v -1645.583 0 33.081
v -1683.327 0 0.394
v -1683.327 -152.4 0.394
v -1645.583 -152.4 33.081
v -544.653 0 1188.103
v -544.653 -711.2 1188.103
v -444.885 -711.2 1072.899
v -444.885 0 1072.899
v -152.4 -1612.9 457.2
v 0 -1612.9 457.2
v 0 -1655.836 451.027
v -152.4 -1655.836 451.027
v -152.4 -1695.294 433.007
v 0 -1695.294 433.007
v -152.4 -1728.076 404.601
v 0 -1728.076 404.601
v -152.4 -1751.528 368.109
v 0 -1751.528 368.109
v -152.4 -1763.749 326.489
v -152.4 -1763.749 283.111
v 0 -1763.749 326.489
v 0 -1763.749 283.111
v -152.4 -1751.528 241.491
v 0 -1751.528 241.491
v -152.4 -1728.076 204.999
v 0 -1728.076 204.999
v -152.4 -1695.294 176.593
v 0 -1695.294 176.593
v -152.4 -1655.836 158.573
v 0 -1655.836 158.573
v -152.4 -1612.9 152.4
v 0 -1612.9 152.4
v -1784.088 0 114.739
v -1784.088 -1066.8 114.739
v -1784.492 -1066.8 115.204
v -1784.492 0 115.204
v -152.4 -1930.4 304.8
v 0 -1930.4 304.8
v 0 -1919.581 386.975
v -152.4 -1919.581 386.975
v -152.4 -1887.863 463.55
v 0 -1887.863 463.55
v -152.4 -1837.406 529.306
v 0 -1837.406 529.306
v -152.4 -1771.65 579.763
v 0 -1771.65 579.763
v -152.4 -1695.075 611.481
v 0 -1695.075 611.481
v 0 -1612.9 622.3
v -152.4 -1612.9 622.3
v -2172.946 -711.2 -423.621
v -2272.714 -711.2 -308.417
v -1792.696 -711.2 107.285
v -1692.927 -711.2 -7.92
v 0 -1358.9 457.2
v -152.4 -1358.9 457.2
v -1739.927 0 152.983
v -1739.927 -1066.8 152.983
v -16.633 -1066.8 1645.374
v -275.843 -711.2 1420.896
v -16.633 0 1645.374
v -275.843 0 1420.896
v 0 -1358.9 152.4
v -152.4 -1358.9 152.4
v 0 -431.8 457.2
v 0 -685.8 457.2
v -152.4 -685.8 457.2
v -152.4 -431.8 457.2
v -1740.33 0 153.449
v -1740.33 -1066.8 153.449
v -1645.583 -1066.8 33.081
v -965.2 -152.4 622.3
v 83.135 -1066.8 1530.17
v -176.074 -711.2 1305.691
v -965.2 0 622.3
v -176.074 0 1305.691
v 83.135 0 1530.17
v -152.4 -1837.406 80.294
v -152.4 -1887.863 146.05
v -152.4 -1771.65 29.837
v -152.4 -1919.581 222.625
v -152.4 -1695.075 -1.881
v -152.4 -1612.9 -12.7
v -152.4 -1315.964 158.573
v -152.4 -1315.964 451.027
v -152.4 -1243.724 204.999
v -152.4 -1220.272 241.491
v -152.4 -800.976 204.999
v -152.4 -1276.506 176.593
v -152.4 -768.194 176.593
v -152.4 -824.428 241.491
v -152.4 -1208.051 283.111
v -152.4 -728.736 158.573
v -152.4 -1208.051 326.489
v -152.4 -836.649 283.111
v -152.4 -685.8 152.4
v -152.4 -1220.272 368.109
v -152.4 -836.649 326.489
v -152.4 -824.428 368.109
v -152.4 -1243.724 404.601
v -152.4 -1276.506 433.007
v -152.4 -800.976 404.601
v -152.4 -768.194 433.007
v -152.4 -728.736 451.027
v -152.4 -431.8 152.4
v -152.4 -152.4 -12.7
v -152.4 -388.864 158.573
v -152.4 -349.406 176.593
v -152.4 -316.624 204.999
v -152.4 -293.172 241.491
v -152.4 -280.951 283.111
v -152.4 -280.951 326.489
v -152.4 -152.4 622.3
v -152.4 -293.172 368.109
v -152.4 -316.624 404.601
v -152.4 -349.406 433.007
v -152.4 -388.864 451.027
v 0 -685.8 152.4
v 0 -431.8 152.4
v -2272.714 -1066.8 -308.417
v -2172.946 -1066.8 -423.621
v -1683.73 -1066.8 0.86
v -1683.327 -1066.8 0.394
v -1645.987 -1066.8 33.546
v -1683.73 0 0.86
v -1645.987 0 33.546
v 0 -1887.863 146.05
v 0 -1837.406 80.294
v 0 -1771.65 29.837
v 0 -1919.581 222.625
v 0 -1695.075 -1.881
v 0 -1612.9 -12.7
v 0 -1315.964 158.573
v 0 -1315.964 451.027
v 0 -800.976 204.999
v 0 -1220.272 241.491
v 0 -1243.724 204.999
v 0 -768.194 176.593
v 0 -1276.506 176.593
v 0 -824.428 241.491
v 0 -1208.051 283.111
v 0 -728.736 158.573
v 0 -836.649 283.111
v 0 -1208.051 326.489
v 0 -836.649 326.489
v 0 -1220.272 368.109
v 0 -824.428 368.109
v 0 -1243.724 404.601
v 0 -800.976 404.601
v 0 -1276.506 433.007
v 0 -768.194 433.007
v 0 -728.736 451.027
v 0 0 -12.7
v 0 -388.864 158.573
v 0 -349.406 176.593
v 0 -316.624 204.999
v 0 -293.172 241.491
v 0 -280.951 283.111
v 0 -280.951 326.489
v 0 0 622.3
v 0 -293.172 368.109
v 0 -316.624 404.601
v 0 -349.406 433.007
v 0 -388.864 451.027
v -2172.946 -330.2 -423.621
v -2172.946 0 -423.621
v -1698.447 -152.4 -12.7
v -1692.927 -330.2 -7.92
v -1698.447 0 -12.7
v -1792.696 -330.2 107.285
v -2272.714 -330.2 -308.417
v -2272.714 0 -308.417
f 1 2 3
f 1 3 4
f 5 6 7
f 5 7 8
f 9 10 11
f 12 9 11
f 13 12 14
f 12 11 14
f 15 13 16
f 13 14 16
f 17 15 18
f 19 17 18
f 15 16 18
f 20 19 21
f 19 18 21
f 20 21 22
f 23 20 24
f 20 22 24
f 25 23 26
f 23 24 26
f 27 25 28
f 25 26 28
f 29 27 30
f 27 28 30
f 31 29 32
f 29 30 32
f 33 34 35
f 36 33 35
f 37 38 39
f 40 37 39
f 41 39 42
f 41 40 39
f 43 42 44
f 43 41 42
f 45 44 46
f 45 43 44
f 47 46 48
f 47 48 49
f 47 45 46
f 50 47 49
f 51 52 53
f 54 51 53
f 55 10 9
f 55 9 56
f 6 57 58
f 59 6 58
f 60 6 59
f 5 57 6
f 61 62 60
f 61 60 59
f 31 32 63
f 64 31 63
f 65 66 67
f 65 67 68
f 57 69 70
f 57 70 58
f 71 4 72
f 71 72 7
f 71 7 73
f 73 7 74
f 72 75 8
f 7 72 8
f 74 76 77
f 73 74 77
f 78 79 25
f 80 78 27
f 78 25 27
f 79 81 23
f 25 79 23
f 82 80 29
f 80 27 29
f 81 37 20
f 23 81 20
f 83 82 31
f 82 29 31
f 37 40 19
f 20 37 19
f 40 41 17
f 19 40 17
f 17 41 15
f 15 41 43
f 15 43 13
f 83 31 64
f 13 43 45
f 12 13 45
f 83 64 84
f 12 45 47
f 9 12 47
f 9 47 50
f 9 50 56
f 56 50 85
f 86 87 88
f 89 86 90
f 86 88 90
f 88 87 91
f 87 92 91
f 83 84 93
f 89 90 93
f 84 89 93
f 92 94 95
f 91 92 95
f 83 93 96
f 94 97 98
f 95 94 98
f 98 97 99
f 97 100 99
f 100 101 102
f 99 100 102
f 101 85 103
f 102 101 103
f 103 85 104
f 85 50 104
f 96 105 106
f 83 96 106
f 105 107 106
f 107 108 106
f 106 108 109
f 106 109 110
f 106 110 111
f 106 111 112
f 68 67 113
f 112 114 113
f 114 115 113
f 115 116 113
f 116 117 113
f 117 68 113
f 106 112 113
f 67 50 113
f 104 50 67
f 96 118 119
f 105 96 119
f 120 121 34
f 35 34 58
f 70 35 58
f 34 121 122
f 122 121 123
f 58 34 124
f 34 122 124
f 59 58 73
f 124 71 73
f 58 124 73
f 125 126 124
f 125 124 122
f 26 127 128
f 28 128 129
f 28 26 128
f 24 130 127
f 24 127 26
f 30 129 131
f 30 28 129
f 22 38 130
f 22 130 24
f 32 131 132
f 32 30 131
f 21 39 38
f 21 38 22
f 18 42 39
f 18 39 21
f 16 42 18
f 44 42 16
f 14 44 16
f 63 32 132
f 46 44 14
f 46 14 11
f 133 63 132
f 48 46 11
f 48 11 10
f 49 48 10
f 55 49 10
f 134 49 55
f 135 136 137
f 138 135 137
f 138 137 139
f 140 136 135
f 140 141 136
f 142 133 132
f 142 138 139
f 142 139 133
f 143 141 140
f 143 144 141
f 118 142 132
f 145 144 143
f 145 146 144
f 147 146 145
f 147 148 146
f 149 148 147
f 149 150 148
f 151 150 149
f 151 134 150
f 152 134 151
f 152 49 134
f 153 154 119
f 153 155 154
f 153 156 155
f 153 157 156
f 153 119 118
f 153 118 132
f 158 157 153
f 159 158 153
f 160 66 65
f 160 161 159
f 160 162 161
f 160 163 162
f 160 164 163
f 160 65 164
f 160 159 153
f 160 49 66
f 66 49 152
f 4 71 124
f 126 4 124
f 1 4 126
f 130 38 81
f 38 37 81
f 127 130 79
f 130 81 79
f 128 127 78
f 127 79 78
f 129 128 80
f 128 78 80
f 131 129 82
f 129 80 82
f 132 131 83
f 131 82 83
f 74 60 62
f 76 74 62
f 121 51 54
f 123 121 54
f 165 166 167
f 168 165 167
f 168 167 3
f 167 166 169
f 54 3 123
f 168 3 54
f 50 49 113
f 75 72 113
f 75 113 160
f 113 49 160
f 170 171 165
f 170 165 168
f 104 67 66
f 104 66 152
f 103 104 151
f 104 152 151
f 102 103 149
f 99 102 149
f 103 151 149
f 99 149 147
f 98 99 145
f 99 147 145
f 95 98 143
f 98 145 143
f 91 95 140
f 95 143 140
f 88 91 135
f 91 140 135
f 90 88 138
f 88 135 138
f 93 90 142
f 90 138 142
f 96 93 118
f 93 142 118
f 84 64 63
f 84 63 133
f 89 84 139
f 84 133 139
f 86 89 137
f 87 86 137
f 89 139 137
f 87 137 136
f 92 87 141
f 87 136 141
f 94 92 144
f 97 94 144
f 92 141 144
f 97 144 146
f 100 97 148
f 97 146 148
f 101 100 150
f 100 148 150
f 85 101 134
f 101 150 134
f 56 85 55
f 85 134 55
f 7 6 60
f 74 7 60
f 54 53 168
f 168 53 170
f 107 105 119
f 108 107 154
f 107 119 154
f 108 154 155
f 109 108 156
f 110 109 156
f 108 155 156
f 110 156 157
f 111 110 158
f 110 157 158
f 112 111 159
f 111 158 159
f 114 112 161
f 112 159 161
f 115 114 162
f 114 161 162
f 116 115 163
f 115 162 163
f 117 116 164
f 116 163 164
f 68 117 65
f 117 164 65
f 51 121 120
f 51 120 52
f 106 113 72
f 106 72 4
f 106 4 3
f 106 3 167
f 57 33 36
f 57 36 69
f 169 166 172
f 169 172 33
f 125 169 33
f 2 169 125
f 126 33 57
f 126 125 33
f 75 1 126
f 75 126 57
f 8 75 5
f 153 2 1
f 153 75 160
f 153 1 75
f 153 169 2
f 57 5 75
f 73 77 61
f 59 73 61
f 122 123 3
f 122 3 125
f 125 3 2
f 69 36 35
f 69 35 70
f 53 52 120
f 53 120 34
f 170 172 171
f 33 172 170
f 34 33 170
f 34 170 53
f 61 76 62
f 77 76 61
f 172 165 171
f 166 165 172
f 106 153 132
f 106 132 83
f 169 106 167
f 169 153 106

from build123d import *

# Parameters (mm, degrees)
F0_W      = 1612.9
F0_H      = 12.7
F0_H_2    = 609.6
F1_DEPTH  = 152.4
F2_W      = 254
F2_H      = 304.8
F3_DEPTH  = 152.4
F4_W      = 317.5
F4_H      = 635
F5_DEPTH  = 152.4
F6_R      = 317.49999
F8_DEPTH  = 152.4
F9_W      = 965.2
F9_H      = 635
F10_DEPTH = 152.4
F12_DEPTH = 152.4
F14_W     = 647.7
F14_H     = 1066.8
F15_DEPTH = 152.4
F16_W     = 2336.8
F16_H     = 1066.8
F17_DEPTH = 152.4
F19_DEPTH = 1066.8
F22_DEPTH = 1066.8
F23_W     = 635
F23_H     = 381
F24_DEPTH = 152.4
F25_W     = 355.6
F25_H     = 711.2
F26_DEPTH = 152.4


# Not quite as in the source:
# - a fillet or chamfer is up to 0.001 mm smaller than in the source, because OpenCascade refuses the exact size
# - a feature names something its author has since deleted; it is built from what else it names


with BuildPart() as f1:
    # F0 (on Right) → F1 (new body)
    with BuildSketch(Plane.YZ):
        with Locations((-806.45, -6.35)):
            Rectangle(F0_W, F0_H)
        with Locations((-806.45, 304.8)):
            Rectangle(F0_W, F0_H_2)
        with Locations((-806.45, 615.95)):
            Rectangle(F0_W, F0_H)
    extrude(amount=-F1_DEPTH)

    # F2 (on face) → F3 (cut)
    with BuildSketch(Plane.YZ):
        with Locations((-558.8, 304.8)):
            Rectangle(F2_W, F2_H)
        with Locations((-1485.9, 304.8)):
            Rectangle(F2_W, F2_H)
    extrude(amount=-F3_DEPTH, mode=Mode.SUBTRACT)

    # F4 (on face) → F5 (join)
    with BuildSketch(Plane.YZ):
        with Locations((-1771.65, 304.8)):
            Rectangle(F4_W, F4_H)
    extrude(amount=-F5_DEPTH)

    # F6 (radius 317.5 in the source; OpenCascade refuses exactly that, so slightly less here)
    f6_edges = [f1.edges().sort_by_distance(p)[0] for p in [
        (-76.2, -1930.4, 622.3),
        (-76.2, -1930.4, -12.7),
    ]]
    fillet(f6_edges, radius=F6_R)

    # F7 (on face) → F8 (cut)
    with BuildSketch(Plane.YZ):
        with BuildLine():
            ThreePointArc((-1485.9, 220.557730325), (-1466.9881087779, 260.8059094878), (-1460.5, 304.8))
            ThreePointArc((-1460.5, 304.8), (-1466.9881087779, 348.7940905122), (-1485.9, 389.042269675))
            ThreePointArc((-1485.9, 389.042269675), (-1511.3, 304.8), (-1485.9, 220.557730325))
        make_face()
        with BuildLine():
            ThreePointArc((-1485.9, 389.042269675), (-1466.9881087779, 348.7940905122), (-1460.5, 304.8))
            ThreePointArc((-1460.5, 304.8), (-1466.9881087779, 260.8059094878), (-1485.9, 220.557730325))
            ThreePointArc((-1485.9, 220.557730325), (-1314.9059094878, 158.8881087779), (-1206.5, 304.8))
            ThreePointArc((-1206.5, 304.8), (-1314.9059094878, 450.7118912221), (-1485.9, 389.042269675))
        make_face()
        with BuildLine():
            ThreePointArc((-1485.9, 220.557730325), (-1511.3, 304.8), (-1485.9, 389.042269675))
            ThreePointArc((-1485.9, 389.042269675), (-1765.3, 304.8), (-1485.9, 220.557730325))
        make_face()
        with BuildLine():
            ThreePointArc((-558.8, 220.557730325), (-539.8881087779, 260.8059094878), (-533.4, 304.8))
            ThreePointArc((-533.4, 304.8), (-539.8881087779, 348.7940905122), (-558.8, 389.042269675))
            ThreePointArc((-558.8, 389.042269675), (-584.2, 304.8), (-558.8, 220.557730325))
        make_face()
        with BuildLine():
            ThreePointArc((-558.8, 389.042269675), (-539.8881087779, 348.7940905122), (-533.4, 304.8))
            ThreePointArc((-533.4, 304.8), (-539.8881087779, 260.8059094878), (-558.8, 220.557730325))
            ThreePointArc((-558.8, 220.557730325), (-387.8059094878, 158.8881087779), (-279.4, 304.8))
            ThreePointArc((-279.4, 304.8), (-387.8059094878, 450.7118912221), (-558.8, 389.042269675))
        make_face()
        with BuildLine():
            ThreePointArc((-558.8, 220.557730325), (-584.2, 304.8), (-558.8, 389.042269675))
            ThreePointArc((-558.8, 389.042269675), (-838.2, 304.8), (-558.8, 220.557730325))
        make_face()
    extrude(amount=-F8_DEPTH, mode=Mode.SUBTRACT)

    # F9 (on face) → F10 (join)
    with BuildSketch(Plane(origin=(0, 0, 0), x_dir=(-1, 0, 0), z_dir=(0, 1, 0))):
        with Locations((482.6, 304.8)):
            Rectangle(F9_W, F9_H)
    extrude(amount=-F10_DEPTH)

    # F11 (on face) → F12 (join)
    with BuildSketch(Plane(origin=(0, 0, 0), x_dir=(-1, 0, 0), z_dir=(0, 1, 0))):
        Polygon((1698.4472, -12.7), (965.2, 622.3), (965.2, -12.7), align=None)
    extrude(amount=-F12_DEPTH)

    # F14 (on offset) → F15 (join)
    with BuildSketch(Plane(origin=(-721.6070671381, 0, 833.2541125657), x_dir=(0.7559344062, 0, 0.6546473658), z_dir=(-0.6546473658, 0, 0.7559344062))):
        with Locations((-1596.0768110359, -533.4)):
            Rectangle(F14_W, F14_H)
    extrude(amount=F15_DEPTH)

    # F16 (on offset) → F17 (join)
    with BuildSketch(Plane(origin=(-721.6070671381, 0, 833.2541125657), x_dir=(0.7559344062, 0, 0.6546473658), z_dir=(-0.6546473658, 0, 0.7559344062))):
        with Locations((-53.897047908, -533.4)):
            Rectangle(F16_W, F16_H)
    extrude(amount=F17_DEPTH)

    # F18 (on face) → F19 (cut)
    with BuildSketch(Plane(origin=(0, 0, 0), x_dir=(-1, 0, 0), z_dir=(0, 1, 0))):
        Polygon((16.6328412597, 1645.374205089), (-21.1158016224, 1678.0649378052), (-120.8840601663, 1562.8605342995), (-83.1354172842, 1530.1698015833), align=None)
    extrude(amount=-F19_DEPTH, mode=Mode.SUBTRACT)

    # F21 (on offset) → F22 (join)
    with BuildSketch(Plane(origin=(0, 0, 0), x_dir=(-1, 0, 0), z_dir=(0, 1, 0))):
        Polygon((1640.5618513332, 38.2444991085), (1684.7235393438, 0), (1784.4917978876, 115.2044035058), (1740.3301098771, 153.4489026143), align=None)
    extrude(amount=-F22_DEPTH)

    # F23 (on face) → F24 (cut)
    with BuildSketch(Plane(origin=(-821.375325682, 0, 948.4585160715), x_dir=(0.7559344062, 0, 0.6546473658), z_dir=(-0.6546473658, 0, 0.7559344062))):
        with Locations((-1602.4268110359, -520.7)):
            Rectangle(F23_W, F23_H)
    extrude(amount=-F24_DEPTH, mode=Mode.SUBTRACT)

    # F25 (on face) → F26 (cut)
    with BuildSketch(Plane(origin=(-821.375325682, 0, 948.4585160715), x_dir=(0.7559344062, 0, 0.6546473658), z_dir=(-0.6546473658, 0, 0.7559344062))):
        with Locations((543.866552092, -355.6)):
            Rectangle(F25_W, F25_H)
    extrude(amount=-F26_DEPTH, mode=Mode.SUBTRACT)


solid = f1.part
